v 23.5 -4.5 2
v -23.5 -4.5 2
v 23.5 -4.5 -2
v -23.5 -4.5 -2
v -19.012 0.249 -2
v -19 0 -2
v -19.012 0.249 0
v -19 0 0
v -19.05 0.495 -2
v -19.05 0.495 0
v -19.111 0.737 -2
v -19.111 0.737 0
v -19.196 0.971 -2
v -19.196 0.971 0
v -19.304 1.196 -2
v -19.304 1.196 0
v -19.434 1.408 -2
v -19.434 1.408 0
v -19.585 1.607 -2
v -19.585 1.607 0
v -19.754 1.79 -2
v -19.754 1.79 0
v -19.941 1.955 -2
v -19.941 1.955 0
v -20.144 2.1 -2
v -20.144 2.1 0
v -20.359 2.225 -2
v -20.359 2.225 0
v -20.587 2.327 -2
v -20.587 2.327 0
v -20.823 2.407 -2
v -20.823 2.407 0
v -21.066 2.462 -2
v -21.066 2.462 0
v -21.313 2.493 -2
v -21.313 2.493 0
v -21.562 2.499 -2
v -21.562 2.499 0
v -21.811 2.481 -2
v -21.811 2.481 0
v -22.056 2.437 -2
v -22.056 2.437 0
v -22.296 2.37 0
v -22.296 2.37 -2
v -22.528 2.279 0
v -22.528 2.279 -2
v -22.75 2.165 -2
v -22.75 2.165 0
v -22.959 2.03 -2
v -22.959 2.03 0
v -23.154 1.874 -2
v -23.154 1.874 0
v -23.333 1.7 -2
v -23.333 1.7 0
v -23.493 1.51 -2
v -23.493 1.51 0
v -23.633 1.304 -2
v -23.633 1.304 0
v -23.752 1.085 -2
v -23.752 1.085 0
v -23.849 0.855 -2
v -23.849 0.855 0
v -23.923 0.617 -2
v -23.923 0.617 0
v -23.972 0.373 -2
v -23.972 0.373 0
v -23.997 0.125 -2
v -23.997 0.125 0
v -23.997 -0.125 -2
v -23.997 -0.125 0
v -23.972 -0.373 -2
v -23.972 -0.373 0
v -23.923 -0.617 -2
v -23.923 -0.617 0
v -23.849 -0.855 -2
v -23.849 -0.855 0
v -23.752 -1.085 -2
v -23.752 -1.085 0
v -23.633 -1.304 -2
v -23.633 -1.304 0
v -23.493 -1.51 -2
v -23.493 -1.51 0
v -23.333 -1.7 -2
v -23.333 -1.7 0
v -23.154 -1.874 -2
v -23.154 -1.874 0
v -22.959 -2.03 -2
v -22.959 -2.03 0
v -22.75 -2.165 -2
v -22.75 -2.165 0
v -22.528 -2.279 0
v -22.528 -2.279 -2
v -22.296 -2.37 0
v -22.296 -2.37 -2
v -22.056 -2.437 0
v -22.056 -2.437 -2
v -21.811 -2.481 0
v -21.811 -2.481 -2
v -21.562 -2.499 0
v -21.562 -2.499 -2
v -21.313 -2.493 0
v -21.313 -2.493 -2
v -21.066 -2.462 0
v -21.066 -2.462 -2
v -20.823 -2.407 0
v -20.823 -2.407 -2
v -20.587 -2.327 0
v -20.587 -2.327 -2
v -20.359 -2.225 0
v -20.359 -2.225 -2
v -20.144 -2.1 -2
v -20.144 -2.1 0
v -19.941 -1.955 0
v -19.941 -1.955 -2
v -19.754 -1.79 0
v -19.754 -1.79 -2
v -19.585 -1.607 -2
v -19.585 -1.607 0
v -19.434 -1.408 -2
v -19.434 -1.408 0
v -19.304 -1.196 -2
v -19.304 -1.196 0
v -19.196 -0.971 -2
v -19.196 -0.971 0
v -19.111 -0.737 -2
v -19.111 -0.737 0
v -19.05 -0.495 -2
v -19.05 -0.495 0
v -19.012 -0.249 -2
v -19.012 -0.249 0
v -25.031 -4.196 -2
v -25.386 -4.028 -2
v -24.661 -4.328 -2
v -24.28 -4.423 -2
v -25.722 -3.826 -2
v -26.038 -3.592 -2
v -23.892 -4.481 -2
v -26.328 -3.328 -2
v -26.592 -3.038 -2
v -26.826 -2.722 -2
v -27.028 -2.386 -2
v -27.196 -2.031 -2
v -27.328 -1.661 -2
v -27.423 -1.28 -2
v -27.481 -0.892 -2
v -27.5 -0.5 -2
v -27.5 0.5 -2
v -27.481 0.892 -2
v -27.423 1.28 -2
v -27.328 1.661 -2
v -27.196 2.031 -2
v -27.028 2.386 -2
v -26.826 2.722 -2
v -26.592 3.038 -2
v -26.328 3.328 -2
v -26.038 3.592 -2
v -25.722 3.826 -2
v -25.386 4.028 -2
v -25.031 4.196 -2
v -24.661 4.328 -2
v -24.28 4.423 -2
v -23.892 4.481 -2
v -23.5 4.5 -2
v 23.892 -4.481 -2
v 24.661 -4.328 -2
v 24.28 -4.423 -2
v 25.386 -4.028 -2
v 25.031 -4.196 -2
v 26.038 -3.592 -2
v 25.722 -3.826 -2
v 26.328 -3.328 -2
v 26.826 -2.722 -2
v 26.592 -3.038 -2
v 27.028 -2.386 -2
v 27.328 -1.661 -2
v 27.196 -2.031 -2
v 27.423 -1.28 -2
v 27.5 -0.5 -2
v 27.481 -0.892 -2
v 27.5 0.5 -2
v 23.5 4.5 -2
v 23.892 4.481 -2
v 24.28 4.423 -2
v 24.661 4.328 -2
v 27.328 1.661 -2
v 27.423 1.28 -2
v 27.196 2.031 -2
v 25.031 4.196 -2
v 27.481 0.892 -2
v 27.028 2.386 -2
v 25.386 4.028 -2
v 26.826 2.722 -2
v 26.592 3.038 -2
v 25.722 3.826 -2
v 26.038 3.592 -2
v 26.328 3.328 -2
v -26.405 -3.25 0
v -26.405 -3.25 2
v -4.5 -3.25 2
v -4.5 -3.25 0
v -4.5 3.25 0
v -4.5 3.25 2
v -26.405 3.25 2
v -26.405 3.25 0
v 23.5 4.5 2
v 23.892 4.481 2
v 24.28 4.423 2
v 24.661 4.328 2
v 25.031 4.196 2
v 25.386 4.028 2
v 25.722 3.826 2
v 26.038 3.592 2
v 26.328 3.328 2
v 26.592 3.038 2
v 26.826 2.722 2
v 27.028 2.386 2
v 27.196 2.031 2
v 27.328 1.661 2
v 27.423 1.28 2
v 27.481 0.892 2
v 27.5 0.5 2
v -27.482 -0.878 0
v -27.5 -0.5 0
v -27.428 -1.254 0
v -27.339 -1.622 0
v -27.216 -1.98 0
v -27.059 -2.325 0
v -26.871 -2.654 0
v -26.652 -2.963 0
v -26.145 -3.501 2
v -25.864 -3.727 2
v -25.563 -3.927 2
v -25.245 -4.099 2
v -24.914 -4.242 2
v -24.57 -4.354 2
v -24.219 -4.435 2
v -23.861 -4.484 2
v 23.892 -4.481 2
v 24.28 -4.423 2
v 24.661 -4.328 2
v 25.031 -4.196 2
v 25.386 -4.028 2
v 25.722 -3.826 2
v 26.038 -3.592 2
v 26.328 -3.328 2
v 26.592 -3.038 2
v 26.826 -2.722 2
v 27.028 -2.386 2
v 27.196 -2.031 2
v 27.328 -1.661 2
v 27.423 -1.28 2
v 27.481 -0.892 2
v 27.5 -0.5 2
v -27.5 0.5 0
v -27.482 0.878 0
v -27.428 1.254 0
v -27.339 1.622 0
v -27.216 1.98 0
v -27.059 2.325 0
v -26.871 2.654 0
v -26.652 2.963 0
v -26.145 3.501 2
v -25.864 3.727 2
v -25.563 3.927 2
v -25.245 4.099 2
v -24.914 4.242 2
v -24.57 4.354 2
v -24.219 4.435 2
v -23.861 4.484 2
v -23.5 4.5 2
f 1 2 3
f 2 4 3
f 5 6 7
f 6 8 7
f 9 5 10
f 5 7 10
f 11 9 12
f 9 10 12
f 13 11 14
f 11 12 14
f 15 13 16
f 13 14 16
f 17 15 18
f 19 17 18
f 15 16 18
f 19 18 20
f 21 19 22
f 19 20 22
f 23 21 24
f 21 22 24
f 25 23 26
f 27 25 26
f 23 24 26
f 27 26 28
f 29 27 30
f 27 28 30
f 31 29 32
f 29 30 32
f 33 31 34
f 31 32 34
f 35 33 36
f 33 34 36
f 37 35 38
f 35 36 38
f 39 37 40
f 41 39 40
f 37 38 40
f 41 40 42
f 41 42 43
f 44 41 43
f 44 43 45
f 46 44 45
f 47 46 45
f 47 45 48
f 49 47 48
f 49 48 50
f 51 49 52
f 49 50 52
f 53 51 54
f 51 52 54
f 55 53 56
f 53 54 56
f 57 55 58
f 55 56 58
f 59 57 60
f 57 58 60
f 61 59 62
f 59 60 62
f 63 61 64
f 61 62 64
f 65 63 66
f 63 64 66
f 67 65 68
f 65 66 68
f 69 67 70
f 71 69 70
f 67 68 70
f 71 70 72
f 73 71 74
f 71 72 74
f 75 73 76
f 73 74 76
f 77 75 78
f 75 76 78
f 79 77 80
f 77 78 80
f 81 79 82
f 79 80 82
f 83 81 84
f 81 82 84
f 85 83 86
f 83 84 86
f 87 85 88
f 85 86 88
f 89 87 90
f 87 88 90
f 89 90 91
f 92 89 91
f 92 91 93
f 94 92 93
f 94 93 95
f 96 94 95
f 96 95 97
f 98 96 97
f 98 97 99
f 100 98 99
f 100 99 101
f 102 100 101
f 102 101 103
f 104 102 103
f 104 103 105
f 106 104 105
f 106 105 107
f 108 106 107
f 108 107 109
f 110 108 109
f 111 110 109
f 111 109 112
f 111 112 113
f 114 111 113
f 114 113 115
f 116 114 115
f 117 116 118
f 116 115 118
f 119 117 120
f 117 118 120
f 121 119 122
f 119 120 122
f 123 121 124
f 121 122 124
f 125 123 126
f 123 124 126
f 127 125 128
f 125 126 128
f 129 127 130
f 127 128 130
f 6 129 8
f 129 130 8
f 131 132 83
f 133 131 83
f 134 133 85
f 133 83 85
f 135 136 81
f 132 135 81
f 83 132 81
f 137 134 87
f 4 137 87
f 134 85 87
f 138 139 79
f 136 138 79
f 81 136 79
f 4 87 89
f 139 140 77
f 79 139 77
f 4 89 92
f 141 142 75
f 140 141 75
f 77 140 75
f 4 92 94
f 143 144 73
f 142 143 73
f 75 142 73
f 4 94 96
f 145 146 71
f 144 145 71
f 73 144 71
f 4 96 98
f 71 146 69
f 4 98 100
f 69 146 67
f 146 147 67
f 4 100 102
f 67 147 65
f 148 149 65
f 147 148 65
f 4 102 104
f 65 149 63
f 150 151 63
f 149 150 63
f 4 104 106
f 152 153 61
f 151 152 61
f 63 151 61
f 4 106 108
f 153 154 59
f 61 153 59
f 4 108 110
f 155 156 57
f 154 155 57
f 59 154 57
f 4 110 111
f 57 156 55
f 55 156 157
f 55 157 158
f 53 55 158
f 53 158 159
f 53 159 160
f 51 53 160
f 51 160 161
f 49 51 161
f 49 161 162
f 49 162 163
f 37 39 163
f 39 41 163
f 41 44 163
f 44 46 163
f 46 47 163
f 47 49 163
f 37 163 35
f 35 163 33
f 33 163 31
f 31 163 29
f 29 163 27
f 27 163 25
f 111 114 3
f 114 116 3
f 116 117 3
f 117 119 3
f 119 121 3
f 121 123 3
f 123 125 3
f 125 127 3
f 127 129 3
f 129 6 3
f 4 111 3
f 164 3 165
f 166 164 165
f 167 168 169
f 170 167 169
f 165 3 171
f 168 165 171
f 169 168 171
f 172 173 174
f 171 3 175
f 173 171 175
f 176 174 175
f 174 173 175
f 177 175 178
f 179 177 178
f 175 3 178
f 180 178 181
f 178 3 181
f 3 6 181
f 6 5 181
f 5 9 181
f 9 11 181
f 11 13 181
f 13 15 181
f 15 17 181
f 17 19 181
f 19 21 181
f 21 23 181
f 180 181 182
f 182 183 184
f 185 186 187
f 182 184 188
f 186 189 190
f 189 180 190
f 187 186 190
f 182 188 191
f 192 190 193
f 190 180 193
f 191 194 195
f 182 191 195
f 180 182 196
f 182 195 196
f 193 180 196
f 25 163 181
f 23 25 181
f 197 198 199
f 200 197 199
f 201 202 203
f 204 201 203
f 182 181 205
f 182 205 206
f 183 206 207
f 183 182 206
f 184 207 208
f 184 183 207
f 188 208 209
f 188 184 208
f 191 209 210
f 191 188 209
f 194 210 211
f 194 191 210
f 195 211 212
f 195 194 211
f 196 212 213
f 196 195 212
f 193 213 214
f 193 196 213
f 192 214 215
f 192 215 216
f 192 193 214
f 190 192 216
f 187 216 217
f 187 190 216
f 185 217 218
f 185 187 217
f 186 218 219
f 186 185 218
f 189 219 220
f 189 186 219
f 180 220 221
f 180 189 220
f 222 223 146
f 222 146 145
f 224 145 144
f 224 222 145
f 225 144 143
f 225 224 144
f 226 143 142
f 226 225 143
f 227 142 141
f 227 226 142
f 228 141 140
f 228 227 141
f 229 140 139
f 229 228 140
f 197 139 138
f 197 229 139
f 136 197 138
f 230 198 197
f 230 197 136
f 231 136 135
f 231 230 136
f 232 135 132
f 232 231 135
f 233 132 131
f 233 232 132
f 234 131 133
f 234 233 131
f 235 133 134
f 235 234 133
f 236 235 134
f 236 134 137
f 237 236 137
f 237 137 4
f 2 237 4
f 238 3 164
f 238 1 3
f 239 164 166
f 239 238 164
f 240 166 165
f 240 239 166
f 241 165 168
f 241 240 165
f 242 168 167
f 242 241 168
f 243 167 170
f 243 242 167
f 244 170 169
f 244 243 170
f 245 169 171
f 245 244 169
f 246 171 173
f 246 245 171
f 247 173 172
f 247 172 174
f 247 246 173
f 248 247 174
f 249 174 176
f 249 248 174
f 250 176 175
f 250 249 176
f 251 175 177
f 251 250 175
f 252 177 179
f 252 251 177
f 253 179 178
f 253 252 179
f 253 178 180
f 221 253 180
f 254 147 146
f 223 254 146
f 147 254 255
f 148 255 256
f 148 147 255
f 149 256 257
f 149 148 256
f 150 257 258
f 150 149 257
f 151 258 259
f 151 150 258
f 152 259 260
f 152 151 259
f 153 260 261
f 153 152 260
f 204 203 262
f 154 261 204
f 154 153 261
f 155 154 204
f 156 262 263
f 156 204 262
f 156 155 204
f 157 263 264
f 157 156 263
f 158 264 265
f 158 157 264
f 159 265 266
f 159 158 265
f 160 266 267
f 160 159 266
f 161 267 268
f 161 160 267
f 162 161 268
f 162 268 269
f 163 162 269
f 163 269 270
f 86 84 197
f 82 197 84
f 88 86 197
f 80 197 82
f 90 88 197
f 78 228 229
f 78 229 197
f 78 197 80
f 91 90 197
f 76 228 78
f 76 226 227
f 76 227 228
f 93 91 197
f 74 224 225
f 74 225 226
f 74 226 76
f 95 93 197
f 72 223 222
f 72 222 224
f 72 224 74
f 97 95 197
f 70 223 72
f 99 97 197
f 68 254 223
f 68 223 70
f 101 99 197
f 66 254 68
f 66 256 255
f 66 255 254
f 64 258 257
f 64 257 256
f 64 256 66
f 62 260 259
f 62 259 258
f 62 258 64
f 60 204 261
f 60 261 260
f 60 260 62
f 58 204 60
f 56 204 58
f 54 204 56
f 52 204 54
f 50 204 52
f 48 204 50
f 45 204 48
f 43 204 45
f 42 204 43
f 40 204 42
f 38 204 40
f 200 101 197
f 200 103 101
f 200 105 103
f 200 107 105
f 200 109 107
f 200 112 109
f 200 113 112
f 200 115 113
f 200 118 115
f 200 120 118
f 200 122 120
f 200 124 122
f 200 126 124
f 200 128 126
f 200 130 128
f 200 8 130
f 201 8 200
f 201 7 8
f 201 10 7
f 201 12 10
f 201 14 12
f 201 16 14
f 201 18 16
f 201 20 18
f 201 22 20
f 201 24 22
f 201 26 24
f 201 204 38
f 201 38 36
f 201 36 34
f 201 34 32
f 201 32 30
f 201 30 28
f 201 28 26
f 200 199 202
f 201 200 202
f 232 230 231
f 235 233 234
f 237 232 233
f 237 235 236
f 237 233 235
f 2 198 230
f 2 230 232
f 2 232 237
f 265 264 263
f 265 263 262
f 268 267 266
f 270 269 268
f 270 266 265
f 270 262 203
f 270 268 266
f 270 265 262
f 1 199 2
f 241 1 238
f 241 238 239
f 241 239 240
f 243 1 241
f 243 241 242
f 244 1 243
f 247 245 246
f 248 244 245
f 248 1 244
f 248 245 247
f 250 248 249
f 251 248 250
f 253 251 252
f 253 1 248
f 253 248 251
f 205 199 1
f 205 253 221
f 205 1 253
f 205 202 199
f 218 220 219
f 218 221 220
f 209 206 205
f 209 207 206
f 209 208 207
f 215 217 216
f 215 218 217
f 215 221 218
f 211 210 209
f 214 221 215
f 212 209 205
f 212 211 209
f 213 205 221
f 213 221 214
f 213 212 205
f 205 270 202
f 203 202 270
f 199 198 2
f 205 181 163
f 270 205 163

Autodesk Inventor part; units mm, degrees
ref_plane "YZ Plane" through (0, 0, 0) normal (1, 0, 0) x (0, 1, 0)
ref_plane "XZ Plane" through (0, 0, 0) normal (0, 1, 0) x (-1, 0, 0)
ref_plane "XY Plane" through (0, 0, 0) normal (0, 0, 1) x (1, 0, 0)
sketch "Sketch1" plane through (0, 0, 0) normal (0, 0, 1) x (1, 0, 0)
  line L0 (-27.5, -4.5) -> (27.5, -4.5)
  line L1 (27.5, -4.5) -> (27.5, 4.5)
  line L2 (27.5, 4.5) -> (-27.5, 4.5)
  line L3 (-27.5, 4.5) -> (-27.5, -4.5)
  line L4 (-27.5, -4.5) -> (27.5, 4.5) construction
  line L5 (27.5, -4.5) -> (-27.5, 4.5) construction
  point P0 (0, 0)
  dimension "d0" = 55
  dimension "d1" = 9
extrude "Extrusion1" add sketch "Sketch1" along normal mid plane 4
sketch "Sketch2" plane through (0, 0, 2) normal (0, 0, 1) x (1, 0, 0)
  line L0 (-27.5, 4.5) -> (-27.5, -4.5) projected
  line L1 (-27.5, -3.25) -> (-4.5, -3.25)
  line L2 (-4.5, -3.25) -> (-4.5, 3.25)
  line L3 (-4.5, 3.25) -> (-27.5, 3.25)
  line L4 (-27.5, 3.25) -> (-27.5, -3.25)
  point P0 (0, 0)
  point P1 (-4.5, 0)
  dimension "d4" = 23
  dimension "d5" = 6.5
extrude "Extrusion2" cut sketch "Sketch2" against normal blind 2
sketch "Sketch3" plane through (0, 0, 0) normal (0, 0, 1) x (1, 0, 0)
  circle A0 centre (-21.5, 0) radius 2.5
  line L0 (-27.5, -3.25) -> (-27.5, 3.25) projected
  point P0 (0, 0)
  dimension "d8" = 5
  dimension "d13" = 6
extrude "Extrusion3" cut sketch "Sketch3" against normal blind 2
fillet "Fillet1" radius 4 2 edges at (27.5, 4.5, 0) (27.5, -4.5, 0)
fillet "Fillet2" radius 4 2 edges at (-27.5, 4.5, 0) (-27.5, -4.5, 0)
properties part number "Servo Arm"
